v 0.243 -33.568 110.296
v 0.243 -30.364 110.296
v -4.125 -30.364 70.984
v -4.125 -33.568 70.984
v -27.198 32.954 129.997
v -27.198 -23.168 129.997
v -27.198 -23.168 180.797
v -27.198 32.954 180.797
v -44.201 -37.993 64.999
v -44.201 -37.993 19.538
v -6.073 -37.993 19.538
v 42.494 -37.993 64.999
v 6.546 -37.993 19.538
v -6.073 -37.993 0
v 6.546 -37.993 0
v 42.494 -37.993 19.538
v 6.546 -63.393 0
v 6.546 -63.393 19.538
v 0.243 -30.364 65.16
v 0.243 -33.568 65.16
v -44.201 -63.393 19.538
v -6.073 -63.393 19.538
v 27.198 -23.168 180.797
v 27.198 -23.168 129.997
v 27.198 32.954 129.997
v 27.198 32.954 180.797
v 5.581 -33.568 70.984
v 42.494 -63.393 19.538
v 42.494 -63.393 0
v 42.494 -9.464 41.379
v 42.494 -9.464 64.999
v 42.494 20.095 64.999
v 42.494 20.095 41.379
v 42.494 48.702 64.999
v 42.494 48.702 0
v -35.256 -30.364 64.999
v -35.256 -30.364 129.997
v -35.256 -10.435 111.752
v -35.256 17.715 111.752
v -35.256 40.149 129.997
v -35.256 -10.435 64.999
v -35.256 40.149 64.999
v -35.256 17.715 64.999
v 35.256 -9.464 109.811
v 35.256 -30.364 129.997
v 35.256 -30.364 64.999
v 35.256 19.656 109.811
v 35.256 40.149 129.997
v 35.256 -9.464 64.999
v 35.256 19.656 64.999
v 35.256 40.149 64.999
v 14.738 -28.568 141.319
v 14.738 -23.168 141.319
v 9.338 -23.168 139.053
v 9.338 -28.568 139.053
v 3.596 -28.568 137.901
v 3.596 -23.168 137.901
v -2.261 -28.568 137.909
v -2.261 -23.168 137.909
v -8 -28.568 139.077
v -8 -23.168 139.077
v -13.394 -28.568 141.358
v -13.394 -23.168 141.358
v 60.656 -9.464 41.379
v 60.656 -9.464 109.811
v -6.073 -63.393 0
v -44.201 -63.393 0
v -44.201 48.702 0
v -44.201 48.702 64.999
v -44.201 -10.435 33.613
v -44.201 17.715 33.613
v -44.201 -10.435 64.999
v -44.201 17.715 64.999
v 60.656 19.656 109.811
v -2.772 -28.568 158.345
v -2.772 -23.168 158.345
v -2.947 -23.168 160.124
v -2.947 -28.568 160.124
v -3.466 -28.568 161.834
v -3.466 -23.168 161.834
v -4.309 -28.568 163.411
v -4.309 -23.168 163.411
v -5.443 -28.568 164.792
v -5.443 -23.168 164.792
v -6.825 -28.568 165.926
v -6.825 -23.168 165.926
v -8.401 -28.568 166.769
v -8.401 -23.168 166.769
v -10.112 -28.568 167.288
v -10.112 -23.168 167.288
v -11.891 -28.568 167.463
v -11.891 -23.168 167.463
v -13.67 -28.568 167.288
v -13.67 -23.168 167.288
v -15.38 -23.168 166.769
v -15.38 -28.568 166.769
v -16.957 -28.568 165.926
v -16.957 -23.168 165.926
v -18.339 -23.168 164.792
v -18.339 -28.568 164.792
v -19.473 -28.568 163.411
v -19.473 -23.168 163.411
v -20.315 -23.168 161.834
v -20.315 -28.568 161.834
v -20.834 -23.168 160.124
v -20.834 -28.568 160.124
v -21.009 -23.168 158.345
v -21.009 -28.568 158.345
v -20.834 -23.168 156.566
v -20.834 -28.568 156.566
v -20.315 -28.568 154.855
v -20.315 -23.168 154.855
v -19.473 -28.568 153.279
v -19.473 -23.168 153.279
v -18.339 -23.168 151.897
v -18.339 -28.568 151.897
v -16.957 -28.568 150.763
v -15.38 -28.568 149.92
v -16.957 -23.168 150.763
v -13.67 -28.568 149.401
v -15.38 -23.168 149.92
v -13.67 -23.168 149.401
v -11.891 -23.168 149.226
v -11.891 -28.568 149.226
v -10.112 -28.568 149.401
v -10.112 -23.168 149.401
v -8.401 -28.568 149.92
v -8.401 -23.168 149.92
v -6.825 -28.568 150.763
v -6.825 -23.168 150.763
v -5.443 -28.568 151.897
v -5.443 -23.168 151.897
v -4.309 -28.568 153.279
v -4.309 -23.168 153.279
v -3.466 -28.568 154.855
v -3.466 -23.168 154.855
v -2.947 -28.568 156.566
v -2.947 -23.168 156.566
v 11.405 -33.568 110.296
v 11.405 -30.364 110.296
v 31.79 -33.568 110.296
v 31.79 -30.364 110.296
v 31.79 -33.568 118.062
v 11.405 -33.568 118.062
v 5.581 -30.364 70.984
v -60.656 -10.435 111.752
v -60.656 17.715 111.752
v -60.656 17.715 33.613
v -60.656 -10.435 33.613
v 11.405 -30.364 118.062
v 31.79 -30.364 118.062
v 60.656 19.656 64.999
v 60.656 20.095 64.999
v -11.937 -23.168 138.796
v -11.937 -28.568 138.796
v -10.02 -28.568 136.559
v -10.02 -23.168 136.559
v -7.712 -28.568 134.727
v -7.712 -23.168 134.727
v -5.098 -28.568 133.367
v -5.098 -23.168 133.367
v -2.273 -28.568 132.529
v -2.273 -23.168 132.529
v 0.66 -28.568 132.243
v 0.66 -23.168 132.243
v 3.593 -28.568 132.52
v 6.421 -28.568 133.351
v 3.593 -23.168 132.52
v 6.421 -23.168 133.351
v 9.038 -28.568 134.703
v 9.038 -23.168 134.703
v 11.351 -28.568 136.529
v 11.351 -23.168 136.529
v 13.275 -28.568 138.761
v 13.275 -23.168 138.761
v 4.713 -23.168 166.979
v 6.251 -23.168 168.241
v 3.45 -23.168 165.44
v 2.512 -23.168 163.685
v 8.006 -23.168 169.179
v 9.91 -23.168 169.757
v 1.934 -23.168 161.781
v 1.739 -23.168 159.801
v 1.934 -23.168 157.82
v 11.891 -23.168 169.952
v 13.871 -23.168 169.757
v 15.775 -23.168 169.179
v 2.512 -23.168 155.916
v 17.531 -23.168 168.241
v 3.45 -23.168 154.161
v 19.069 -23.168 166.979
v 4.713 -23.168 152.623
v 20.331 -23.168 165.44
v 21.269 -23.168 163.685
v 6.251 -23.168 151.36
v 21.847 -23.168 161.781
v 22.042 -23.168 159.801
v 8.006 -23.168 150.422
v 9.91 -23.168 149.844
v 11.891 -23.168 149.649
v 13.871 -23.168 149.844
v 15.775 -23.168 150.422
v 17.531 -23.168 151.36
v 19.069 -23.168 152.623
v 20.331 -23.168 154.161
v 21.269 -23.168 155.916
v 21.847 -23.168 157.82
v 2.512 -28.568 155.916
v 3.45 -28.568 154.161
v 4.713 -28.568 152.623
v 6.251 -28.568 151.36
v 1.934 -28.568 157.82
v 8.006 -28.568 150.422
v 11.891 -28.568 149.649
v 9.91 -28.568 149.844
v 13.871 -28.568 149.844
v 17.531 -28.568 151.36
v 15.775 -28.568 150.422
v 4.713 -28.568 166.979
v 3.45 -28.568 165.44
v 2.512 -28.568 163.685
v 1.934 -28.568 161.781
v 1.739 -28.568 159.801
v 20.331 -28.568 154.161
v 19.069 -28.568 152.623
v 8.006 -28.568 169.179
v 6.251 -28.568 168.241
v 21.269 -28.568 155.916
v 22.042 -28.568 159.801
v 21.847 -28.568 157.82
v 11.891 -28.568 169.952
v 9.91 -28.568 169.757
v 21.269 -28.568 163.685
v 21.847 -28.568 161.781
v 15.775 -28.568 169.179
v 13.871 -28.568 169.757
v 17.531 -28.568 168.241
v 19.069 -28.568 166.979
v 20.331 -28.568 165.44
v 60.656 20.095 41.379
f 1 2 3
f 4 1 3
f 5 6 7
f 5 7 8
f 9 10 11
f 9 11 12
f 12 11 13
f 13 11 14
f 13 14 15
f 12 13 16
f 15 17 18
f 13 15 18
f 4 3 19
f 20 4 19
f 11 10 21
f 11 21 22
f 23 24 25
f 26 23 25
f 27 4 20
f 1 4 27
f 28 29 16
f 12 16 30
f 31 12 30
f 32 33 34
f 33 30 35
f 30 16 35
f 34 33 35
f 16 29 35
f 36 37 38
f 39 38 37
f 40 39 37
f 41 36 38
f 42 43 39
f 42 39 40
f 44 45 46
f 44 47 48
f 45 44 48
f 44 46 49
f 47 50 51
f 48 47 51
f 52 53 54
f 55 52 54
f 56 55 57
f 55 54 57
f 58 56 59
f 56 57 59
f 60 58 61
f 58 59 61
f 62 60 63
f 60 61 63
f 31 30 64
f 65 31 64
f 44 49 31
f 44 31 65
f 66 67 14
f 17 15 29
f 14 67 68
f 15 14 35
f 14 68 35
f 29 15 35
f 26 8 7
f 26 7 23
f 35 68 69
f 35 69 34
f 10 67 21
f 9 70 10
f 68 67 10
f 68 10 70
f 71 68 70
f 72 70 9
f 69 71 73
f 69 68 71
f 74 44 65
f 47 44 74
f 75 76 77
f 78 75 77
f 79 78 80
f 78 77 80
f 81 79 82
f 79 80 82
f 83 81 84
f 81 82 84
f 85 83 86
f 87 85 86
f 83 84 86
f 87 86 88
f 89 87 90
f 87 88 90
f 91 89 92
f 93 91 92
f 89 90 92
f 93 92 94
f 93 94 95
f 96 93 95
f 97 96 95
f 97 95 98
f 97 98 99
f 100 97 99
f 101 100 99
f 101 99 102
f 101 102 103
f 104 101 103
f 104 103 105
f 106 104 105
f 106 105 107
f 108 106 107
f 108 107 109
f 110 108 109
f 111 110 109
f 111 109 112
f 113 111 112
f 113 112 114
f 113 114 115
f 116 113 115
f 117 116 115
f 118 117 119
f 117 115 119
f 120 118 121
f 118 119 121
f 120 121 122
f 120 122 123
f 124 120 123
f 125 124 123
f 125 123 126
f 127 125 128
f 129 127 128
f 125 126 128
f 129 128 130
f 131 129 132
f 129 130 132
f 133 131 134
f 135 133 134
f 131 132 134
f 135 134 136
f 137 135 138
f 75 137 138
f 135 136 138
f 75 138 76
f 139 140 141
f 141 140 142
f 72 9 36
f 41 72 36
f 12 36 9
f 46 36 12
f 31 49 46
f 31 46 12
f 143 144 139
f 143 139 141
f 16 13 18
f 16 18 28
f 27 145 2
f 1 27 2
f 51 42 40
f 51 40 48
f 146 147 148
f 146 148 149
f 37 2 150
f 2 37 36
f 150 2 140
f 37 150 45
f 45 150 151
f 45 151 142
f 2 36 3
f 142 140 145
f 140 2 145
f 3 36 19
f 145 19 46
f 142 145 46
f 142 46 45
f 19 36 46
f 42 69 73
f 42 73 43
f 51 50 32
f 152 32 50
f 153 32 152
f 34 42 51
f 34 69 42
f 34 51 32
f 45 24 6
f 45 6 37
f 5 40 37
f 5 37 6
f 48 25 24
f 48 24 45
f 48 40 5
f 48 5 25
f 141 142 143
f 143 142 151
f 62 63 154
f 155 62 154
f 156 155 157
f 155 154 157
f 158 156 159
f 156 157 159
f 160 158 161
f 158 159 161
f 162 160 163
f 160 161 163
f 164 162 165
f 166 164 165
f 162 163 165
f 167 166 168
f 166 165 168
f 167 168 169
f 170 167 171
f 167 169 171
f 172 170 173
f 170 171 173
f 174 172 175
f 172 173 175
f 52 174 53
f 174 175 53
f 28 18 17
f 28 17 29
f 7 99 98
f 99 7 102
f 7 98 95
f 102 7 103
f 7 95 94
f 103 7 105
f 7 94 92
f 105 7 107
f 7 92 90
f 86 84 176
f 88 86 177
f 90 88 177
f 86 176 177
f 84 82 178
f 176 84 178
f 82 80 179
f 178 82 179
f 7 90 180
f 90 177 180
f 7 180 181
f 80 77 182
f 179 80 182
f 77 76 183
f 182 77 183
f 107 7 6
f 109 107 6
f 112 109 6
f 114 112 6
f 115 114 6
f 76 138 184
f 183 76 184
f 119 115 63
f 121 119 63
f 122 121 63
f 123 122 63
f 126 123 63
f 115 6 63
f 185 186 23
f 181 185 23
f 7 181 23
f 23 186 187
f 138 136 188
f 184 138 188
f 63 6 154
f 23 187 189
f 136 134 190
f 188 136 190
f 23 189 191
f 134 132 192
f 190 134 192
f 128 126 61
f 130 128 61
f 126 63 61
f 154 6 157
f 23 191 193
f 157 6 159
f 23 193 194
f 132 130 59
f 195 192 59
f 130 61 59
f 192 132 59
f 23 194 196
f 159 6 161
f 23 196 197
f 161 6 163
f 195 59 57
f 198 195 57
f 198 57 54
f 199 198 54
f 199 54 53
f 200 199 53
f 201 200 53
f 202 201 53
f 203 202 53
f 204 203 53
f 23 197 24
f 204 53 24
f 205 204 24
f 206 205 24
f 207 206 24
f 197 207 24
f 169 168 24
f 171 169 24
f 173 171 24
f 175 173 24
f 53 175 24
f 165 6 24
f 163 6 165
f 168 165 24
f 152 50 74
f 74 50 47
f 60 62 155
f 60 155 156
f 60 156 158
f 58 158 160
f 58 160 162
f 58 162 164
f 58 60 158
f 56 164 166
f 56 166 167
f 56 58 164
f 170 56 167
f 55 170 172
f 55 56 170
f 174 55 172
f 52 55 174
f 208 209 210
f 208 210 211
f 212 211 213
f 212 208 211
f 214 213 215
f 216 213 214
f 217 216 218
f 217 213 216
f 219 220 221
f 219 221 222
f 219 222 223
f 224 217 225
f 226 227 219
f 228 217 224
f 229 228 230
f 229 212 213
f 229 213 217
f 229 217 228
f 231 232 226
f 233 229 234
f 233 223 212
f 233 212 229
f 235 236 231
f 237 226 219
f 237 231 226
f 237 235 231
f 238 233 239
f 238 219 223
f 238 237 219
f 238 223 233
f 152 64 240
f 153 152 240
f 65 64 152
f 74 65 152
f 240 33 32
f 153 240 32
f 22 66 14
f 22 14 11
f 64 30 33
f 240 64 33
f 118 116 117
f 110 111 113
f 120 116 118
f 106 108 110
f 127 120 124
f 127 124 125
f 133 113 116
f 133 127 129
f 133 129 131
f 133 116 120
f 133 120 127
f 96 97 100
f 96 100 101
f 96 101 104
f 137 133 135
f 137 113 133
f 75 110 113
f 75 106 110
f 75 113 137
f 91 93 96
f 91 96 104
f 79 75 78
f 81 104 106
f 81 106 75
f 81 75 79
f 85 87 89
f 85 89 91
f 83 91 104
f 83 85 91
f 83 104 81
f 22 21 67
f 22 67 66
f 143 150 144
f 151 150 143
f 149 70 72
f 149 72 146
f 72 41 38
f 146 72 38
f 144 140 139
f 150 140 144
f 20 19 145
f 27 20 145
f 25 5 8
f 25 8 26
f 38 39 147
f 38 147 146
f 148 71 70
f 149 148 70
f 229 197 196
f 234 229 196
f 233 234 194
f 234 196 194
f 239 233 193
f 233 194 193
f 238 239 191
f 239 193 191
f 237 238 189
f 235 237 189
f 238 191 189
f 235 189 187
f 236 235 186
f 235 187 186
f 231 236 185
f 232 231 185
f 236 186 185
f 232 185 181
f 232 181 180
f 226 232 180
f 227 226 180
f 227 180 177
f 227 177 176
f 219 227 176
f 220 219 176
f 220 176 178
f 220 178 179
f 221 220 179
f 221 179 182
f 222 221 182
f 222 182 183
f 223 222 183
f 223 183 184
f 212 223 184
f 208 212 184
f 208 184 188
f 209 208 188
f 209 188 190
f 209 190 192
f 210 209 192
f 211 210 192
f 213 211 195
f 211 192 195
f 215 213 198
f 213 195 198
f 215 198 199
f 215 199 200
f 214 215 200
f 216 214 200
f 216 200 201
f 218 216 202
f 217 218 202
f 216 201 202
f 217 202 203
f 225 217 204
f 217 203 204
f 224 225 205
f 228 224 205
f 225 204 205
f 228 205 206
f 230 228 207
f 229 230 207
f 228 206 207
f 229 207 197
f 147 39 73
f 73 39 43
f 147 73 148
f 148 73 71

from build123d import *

# Parameters (mm, degrees)
F0_W      = 86.6950079799
F0_H      = 86.6950042546
F1_DEPTH  = 64.9986
F2_W      = 70.5124139786
F2_H      = 70.5124102533
F3_DEPTH  = 64.9986
F4_W      = 54.395288229
F4_H      = 56.1221279204
F5_DEPTH  = 50.8
F6_R      = 9.1186421801
F6_R_2    = 10.1513194638
F6_W      = 20.3841309994
F6_H      = 7.7653825283
F7_DEPTH  = 25.4
F8_W      = 29.1201900691
F8_H      = 44.812363273
F9_DEPTH  = 25.4
F10_W     = 29.5586548746
F10_H     = 23.6200721203
F11_DEPTH = 25.4
F12_W     = 28.1495144591
F12_H     = 46.7537163557
F12_H_2   = 31.3854509233
F13_DEPTH = 25.4
F15_DEPTH = 25.4
F16_W     = 38.1280947477
F16_H     = 19.5383913815
F16_W_2   = 35.9481638297
F17_DEPTH = 25.4
F19_DEPTH = 20
F18_W     = 20.3841309994
F18_H     = 7.7653825283
F20_DEPTH = 15


with BuildPart() as f1:
    # F0 (on Top) → F1 (new body)
    with BuildSketch(Plane.XY):
        with Locations((-0.8532218635, 5.3543392569)):
            Rectangle(F0_W, F0_H)
    extrude(amount=F1_DEPTH)

    # F2 (on face) → F3 (join)
    with BuildSketch(Plane.XY.offset(64.9986)):
        with Locations((0, 4.8926975578)):
            Rectangle(F2_W, F2_H)
    extrude(amount=F3_DEPTH)

    # F4 (on face) → F5 (join)
    with BuildSketch(Plane.XY.offset(129.9972)):
        with Locations((0, 4.8926975578)):
            Rectangle(F4_W, F4_H)
    extrude(amount=F5_DEPTH)

    # F6 (on face) → F7 (join)
    with BuildSketch(Plane.XZ.offset(23.1683664024)):
        with Locations((-11.8907419965, 158.3446115255)):
            Circle(F6_R)
        with Locations((11.8907429278, 159.8006188869)):
            Circle(F6_R_2)
        Polygon((5.5813710205, 70.9840506315), (0.2426664723, 110.2963015437), (0.2426664723, 65.1600137353), align=None)
        Polygon((0.2426664723, 65.1600137353), (0.2426664723, 110.2963015437), (-4.1253603995, 70.9840506315), align=None)
        with Locations((21.5974720195, 114.1789928079)):
            Rectangle(F6_W, F6_H)
    extrude(amount=F7_DEPTH)

    # F8 (on face) → F9 (join)
    with BuildSketch(Plane.YZ.offset(35.2562069893)):
        with Locations((5.0960322842, 87.4047816365)):
            Rectangle(F8_W, F8_H)
    extrude(amount=F9_DEPTH)

    # F10 (on face) → F11 (join)
    with BuildSketch(Plane.YZ.offset(35.2562069893)):
        with Locations((5.3152646869, 53.1885639399)):
            Rectangle(F10_W, F10_H)
    extrude(amount=F11_DEPTH)

    # F12 (on face) → F13 (join)
    with BuildSketch(Plane(origin=(-35.2562069893, 0, 0), x_dir=(0, -1, 0), z_dir=(-1, 0, 0))):
        with Locations((-3.6400225945, 88.3754581779)):
            Rectangle(F12_W, F12_H)
        with Locations((-3.6400225945, 49.3058745384)):
            Rectangle(F12_W, F12_H_2)
    extrude(amount=F13_DEPTH)

    # F14 (on face) → F15 (join)
    with BuildSketch(Plane.XZ.offset(23.1683664024)):
        with BuildLine():
            ThreePointArc((14.7383239205, 141.318809308), (0.6673846717, 137.7586777296), (-13.3936218917, 141.3578391075))
            ThreePointArc((-13.3936218917, 141.3578391075), (0.6597323084, 132.2429981429), (14.7383239205, 141.318809308))
        make_face()
    extrude(amount=F15_DEPTH)

    # F16 (on face) → F17 (join)
    with BuildSketch(Plane.XZ.offset(37.9931628704)):
        with Locations((-25.1366784796, 9.7691956908)):
            Rectangle(F16_W, F16_H)
        with Locations((24.5202002116, 9.7691956908)):
            Rectangle(F16_W_2, F16_H)
    extrude(amount=F17_DEPTH)

    # F19 (cut): faces of the model
    f19_faces = [f1.faces().sort_by_distance(p)[0] for p in [
        (-11.8907419965, -48.5683664024, 158.3446115255),
        (11.8907429278, -48.5683664024, 159.8006188869),
        (0.665272449, -48.5683664024, 136.2362272974),
    ]]
    extrude(f19_faces, amount=-F19_DEPTH, mode=Mode.SUBTRACT)

    # F18 (on face) → F20 (cut)
    with BuildSketch(Plane.XZ.offset(48.5683664024)):
        Polygon((5.5813710205, 70.9840506315), (0.2426664723, 110.2963015437), (-4.1253603995, 70.9840506315), (0.2426664723, 65.1600137353), align=None)
        with Locations((21.5974720195, 114.1789928079)):
            Rectangle(F18_W, F18_H)
    extrude(amount=-F20_DEPTH, mode=Mode.SUBTRACT)


solid = f1.part
